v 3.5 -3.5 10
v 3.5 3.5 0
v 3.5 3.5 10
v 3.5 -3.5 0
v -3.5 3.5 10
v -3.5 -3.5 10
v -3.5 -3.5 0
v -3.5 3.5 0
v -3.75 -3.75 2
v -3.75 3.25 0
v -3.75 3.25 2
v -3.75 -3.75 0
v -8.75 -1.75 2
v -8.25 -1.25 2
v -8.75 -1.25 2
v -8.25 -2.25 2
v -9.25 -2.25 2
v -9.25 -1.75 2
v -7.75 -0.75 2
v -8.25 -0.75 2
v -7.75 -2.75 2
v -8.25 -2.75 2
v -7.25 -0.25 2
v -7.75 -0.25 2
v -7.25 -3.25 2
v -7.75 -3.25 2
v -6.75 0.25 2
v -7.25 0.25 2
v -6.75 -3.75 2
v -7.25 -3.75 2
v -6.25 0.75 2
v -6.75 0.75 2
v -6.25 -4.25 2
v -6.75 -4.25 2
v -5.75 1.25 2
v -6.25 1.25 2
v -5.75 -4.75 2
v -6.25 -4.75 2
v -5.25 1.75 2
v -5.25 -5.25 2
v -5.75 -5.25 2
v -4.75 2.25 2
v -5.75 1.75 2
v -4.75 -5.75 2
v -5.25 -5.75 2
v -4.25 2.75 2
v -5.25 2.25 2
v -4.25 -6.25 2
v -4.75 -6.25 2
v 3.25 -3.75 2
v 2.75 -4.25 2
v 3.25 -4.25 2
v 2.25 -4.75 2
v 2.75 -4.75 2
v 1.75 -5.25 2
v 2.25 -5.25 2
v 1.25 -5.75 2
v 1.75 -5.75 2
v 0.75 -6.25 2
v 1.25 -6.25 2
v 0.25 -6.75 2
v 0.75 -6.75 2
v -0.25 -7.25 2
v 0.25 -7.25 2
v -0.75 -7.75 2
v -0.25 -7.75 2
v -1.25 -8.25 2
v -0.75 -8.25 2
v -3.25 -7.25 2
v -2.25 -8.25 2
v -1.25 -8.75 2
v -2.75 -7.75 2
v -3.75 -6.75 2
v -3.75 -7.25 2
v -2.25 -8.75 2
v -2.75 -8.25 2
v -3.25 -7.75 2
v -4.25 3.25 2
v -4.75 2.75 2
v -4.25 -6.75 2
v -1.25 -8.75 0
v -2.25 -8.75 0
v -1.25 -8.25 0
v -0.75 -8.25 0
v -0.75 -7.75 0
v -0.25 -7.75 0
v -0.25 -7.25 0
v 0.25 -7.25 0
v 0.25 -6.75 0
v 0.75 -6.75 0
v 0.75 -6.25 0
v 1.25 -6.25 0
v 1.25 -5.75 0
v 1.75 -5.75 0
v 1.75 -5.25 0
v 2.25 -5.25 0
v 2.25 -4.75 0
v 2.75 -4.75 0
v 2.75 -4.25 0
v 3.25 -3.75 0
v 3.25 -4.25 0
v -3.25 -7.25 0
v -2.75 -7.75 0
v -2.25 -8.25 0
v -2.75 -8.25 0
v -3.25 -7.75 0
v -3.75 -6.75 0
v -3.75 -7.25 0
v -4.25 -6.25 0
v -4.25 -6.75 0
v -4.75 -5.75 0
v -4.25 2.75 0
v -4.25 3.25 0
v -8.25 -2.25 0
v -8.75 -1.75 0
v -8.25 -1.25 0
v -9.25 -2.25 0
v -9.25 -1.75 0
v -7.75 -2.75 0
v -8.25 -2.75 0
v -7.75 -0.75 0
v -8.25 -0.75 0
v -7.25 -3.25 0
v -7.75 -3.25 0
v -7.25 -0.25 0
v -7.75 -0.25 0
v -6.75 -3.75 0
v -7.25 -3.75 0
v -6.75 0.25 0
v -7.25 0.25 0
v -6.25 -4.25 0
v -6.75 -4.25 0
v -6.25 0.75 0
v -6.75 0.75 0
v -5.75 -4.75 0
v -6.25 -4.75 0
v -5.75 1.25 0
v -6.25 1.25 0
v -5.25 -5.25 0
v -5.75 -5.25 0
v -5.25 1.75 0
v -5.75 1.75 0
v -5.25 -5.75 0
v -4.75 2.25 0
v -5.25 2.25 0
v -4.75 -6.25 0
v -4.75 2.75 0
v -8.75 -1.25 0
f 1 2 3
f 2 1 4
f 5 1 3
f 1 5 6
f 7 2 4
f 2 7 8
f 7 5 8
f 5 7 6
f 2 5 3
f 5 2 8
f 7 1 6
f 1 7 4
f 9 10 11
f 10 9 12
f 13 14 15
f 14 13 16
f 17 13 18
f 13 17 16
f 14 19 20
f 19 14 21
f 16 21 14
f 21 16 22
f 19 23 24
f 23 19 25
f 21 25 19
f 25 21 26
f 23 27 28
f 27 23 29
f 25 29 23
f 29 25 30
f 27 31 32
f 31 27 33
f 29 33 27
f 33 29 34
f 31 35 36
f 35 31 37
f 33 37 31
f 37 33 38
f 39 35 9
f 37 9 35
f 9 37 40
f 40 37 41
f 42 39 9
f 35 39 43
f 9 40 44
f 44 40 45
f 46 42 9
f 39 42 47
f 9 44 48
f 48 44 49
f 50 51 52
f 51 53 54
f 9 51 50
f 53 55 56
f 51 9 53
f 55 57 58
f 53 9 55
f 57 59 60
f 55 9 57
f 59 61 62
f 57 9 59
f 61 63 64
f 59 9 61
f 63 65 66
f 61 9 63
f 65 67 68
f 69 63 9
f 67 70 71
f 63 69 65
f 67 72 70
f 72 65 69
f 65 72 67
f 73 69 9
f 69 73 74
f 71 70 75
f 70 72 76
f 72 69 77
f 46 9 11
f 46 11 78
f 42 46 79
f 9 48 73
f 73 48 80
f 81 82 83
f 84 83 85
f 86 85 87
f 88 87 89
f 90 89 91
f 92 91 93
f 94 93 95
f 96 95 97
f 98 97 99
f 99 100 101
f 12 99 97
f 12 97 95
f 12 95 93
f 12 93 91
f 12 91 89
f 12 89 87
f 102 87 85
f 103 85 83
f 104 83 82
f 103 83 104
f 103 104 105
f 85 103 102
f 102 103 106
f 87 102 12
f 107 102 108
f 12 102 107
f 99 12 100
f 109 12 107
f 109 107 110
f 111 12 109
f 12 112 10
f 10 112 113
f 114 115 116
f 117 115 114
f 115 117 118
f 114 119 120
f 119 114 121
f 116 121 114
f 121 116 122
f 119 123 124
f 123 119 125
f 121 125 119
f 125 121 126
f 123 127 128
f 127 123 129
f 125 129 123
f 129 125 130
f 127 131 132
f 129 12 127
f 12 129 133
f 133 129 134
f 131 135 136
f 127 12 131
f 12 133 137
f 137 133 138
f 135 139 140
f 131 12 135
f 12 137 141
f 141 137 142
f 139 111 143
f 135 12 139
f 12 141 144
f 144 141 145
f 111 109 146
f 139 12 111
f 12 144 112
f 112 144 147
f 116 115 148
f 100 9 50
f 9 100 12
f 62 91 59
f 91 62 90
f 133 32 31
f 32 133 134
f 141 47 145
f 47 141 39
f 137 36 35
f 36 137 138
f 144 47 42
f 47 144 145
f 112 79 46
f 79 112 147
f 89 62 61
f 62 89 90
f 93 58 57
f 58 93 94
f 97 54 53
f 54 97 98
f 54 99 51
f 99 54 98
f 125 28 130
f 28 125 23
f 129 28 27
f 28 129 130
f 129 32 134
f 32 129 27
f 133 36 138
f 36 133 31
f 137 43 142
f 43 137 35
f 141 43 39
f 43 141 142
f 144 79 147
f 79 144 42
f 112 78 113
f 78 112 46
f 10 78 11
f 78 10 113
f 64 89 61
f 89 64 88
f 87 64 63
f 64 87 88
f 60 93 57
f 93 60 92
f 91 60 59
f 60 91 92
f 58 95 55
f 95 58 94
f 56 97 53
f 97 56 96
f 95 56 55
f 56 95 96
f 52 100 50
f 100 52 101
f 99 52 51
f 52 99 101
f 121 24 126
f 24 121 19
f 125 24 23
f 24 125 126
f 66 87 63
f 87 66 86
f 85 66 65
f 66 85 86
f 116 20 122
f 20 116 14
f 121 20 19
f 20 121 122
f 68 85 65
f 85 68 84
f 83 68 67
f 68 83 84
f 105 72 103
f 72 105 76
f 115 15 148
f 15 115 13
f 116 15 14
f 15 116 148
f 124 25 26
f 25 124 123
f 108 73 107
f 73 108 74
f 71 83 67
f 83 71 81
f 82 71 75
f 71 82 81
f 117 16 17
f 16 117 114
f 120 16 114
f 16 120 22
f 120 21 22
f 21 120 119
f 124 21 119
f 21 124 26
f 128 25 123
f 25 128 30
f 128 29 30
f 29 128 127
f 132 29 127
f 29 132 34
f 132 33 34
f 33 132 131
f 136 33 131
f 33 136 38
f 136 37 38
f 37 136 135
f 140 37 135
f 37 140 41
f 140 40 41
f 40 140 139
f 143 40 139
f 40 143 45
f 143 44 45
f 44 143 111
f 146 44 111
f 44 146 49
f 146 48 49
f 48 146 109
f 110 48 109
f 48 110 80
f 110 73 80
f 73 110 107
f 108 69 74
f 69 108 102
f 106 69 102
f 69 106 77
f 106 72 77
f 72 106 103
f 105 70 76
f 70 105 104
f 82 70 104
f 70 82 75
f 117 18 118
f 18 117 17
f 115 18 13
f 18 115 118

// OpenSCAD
translate([0, 0, 5]) color([0,1,0,0.9]) cube([7, 7, 10], center=true);
translate([-4.0, 0.0, 1]) color([1,0,0]) cube([0.5, 0.5, 2], center=true);
translate([0.0, -4.0, 1]) color([1,0,0]) cube([0.5, 0.5, 2], center=true);
translate([-4.5, 0.0, 1]) color([1,0,0]) cube([0.5, 0.5, 2], center=true);
translate([-4.0, -0.5, 1]) color([1,0,0]) cube([0.5, 0.5, 2], center=true);
translate([-4.0, 0.5, 1]) color([1,0,0]) cube([0.5, 0.5, 2], center=true);
translate([-0.5, -4.0, 1]) color([1,0,0]) cube([0.5, 0.5, 2], center=true);
translate([0.0, -4.5, 1]) color([1,0,0]) cube([0.5, 0.5, 2], center=true);
translate([0.5, -4.0, 1]) color([1,0,0]) cube([0.5, 0.5, 2], center=true);
translate([-5.0, 0.0, 1]) color([1,0,0]) cube([0.5, 0.5, 2], center=true);
translate([-4.5, -0.5, 1]) color([1,0,0]) cube([0.5, 0.5, 2], center=true);
translate([-4.5, 0.5, 1]) color([1,0,0]) cube([0.5, 0.5, 2], center=true);
translate([-4.0, -1.0, 1]) color([1,0,0]) cube([0.5, 0.5, 2], center=true);
translate([-4.0, 1.0, 1]) color([1,0,0]) cube([0.5, 0.5, 2], center=true);
translate([-1.0, -4.0, 1]) color([1,0,0]) cube([0.5, 0.5, 2], center=true);
translate([-0.5, -4.5, 1]) color([1,0,0]) cube([0.5, 0.5, 2], center=true);
translate([0.0, -5.0, 1]) color([1,0,0]) cube([0.5, 0.5, 2], center=true);
translate([0.5, -4.5, 1]) color([1,0,0]) cube([0.5, 0.5, 2], center=true);
translate([1.0, -4.0, 1]) color([1,0,0]) cube([0.5, 0.5, 2], center=true);
translate([-5.5, 0.0, 1]) color([1,0,0]) cube([0.5, 0.5, 2], center=true);
translate([-5.0, -0.5, 1]) color([1,0,0]) cube([0.5, 0.5, 2], center=true);
translate([-5.0, 0.5, 1]) color([1,0,0]) cube([0.5, 0.5, 2], center=true);
translate([-4.5, -1.0, 1]) color([1,0,0]) cube([0.5, 0.5, 2], center=true);
translate([-4.5, 1.0, 1]) color([1,0,0]) cube([0.5, 0.5, 2], center=true);
translate([-4.0, -1.5, 1]) color([1,0,0]) cube([0.5, 0.5, 2], center=true);
translate([-4.0, 1.5, 1]) color([1,0,0]) cube([0.5, 0.5, 2], center=true);
translate([-1.5, -4.0, 1]) color([1,0,0]) cube([0.5, 0.5, 2], center=true);
translate([-1.0, -4.5, 1]) color([1,0,0]) cube([0.5, 0.5, 2], center=true);
translate([-0.5, -5.0, 1]) color([1,0,0]) cube([0.5, 0.5, 2], center=true);
translate([0.0, -5.5, 1]) color([1,0,0]) cube([0.5, 0.5, 2], center=true);
translate([0.5, -5.0, 1]) color([1,0,0]) cube([0.5, 0.5, 2], center=true);
translate([1.0, -4.5, 1]) color([1,0,0]) cube([0.5, 0.5, 2], center=true);
translate([1.5, -4.0, 1]) color([1,0,0]) cube([0.5, 0.5, 2], center=true);
translate([-6.0, 0.0, 1]) color([1,0,0]) cube([0.5, 0.5, 2], center=true);
translate([-5.5, -0.5, 1]) color([1,0,0]) cube([0.5, 0.5, 2], center=true);
translate([-5.5, 0.5, 1]) color([1,0,0]) cube([0.5, 0.5, 2], center=true);
translate([-5.0, -1.0, 1]) color([1,0,0]) cube([0.5, 0.5, 2], center=true);
translate([-5.0, 1.0, 1]) color([1,0,0]) cube([0.5, 0.5, 2], center=true);
translate([-4.5, -1.5, 1]) color([1,0,0]) cube([0.5, 0.5, 2], center=true);
translate([-4.5, 1.5, 1]) color([1,0,0]) cube([0.5, 0.5, 2], center=true);
translate([-4.0, -2.0, 1]) color([1,0,0]) cube([0.5, 0.5, 2], center=true);
translate([-4.0, 2.0, 1]) color([1,0,0]) cube([0.5, 0.5, 2], center=true);
translate([-2.0, -4.0, 1]) color([1,0,0]) cube([0.5, 0.5, 2], center=true);
translate([-1.5, -4.5, 1]) color([1,0,0]) cube([0.5, 0.5, 2], center=true);
translate([-1.0, -5.0, 1]) color([1,0,0]) cube([0.5, 0.5, 2], center=true);
translate([-0.5, -5.5, 1]) color([1,0,0]) cube([0.5, 0.5, 2], center=true);
translate([0.0, -6.0, 1]) color([1,0,0]) cube([0.5, 0.5, 2], center=true);
translate([0.5, -5.5, 1]) color([1,0,0]) cube([0.5, 0.5, 2], center=true);
translate([1.0, -5.0, 1]) color([1,0,0]) cube([0.5, 0.5, 2], center=true);
translate([1.5, -4.5, 1]) color([1,0,0]) cube([0.5, 0.5, 2], center=true);
translate([2.0, -4.0, 1]) color([1,0,0]) cube([0.5, 0.5, 2], center=true);
translate([-6.5, 0.0, 1]) color([1,0,0]) cube([0.5, 0.5, 2], center=true);
translate([-6.0, -0.5, 1]) color([1,0,0]) cube([0.5, 0.5, 2], center=true);
translate([-6.0, 0.5, 1]) color([1,0,0]) cube([0.5, 0.5, 2], center=true);
translate([-5.5, -1.0, 1]) color([1,0,0]) cube([0.5, 0.5, 2], center=true);
translate([-5.5, 1.0, 1]) color([1,0,0]) cube([0.5, 0.5, 2], center=true);
translate([-5.0, -1.5, 1]) color([1,0,0]) cube([0.5, 0.5, 2], center=true);
translate([-5.0, 1.5, 1]) color([1,0,0]) cube([0.5, 0.5, 2], center=true);
translate([-4.5, -2.0, 1]) color([1,0,0]) cube([0.5, 0.5, 2], center=true);
translate([-4.5, 2.0, 1]) color([1,0,0]) cube([0.5, 0.5, 2], center=true);
translate([-4.0, -2.5, 1]) color([1,0,0]) cube([0.5, 0.5, 2], center=true);
translate([-4.0, 2.5, 1]) color([1,0,0]) cube([0.5, 0.5, 2], center=true);
translate([-2.5, -4.0, 1]) color([1,0,0]) cube([0.5, 0.5, 2], center=true);
translate([-2.0, -4.5, 1]) color([1,0,0]) cube([0.5, 0.5, 2], center=true);
translate([-1.5, -5.0, 1]) color([1,0,0]) cube([0.5, 0.5, 2], center=true);
translate([-1.0, -5.5, 1]) color([1,0,0]) cube([0.5, 0.5, 2], center=true);
translate([-0.5, -6.0, 1]) color([1,0,0]) cube([0.5, 0.5, 2], center=true);
translate([0.0, -6.5, 1]) color([1,0,0]) cube([0.5, 0.5, 2], center=true);
translate([0.5, -6.0, 1]) color([1,0,0]) cube([0.5, 0.5, 2], center=true);
translate([1.0, -5.5, 1]) color([1,0,0]) cube([0.5, 0.5, 2], center=true);
translate([1.5, -5.0, 1]) color([1,0,0]) cube([0.5, 0.5, 2], center=true);
translate([2.0, -4.5, 1]) color([1,0,0]) cube([0.5, 0.5, 2], center=true);
translate([2.5, -4.0, 1]) color([1,0,0]) cube([0.5, 0.5, 2], center=true);
translate([-7.0, 0.0, 1]) color([1,0,0]) cube([0.5, 0.5, 2], center=true);
translate([-6.5, -0.5, 1]) color([1,0,0]) cube([0.5, 0.5, 2], center=true);
translate([-6.5, 0.5, 1]) color([1,0,0]) cube([0.5, 0.5, 2], center=true);
translate([-6.0, -1.0, 1]) color([1,0,0]) cube([0.5, 0.5, 2], center=true);
translate([-6.0, 1.0, 1]) color([1,0,0]) cube([0.5, 0.5, 2], center=true);
translate([-5.5, -1.5, 1]) color([1,0,0]) cube([0.5, 0.5, 2], center=true);
translate([-5.5, 1.5, 1]) color([1,0,0]) cube([0.5, 0.5, 2], center=true);
translate([-5.0, -2.0, 1]) color([1,0,0]) cube([0.5, 0.5, 2], center=true);
translate([-5.0, 2.0, 1]) color([1,0,0]) cube([0.5, 0.5, 2], center=true);
translate([-4.5, -2.5, 1]) color([1,0,0]) cube([0.5, 0.5, 2], center=true);
translate([-4.5, 2.5, 1]) color([1,0,0]) cube([0.5, 0.5, 2], center=true);
translate([-4.0, -3.0, 1]) color([1,0,0]) cube([0.5, 0.5, 2], center=true);
translate([-4.0, 3.0, 1]) color([1,0,0]) cube([0.5, 0.5, 2], center=true);
translate([-3.0, -4.0, 1]) color([1,0,0]) cube([0.5, 0.5, 2], center=true);
translate([-2.5, -4.5, 1]) color([1,0,0]) cube([0.5, 0.5, 2], center=true);
translate([-2.0, -5.0, 1]) color([1,0,0]) cube([0.5, 0.5, 2], center=true);
translate([-1.5, -5.5, 1]) color([1,0,0]) cube([0.5, 0.5, 2], center=true);
translate([-1.0, -6.0, 1]) color([1,0,0]) cube([0.5, 0.5, 2], center=true);
translate([-0.5, -6.5, 1]) color([1,0,0]) cube([0.5, 0.5, 2], center=true);
translate([0.0, -7.0, 1]) color([1,0,0]) cube([0.5, 0.5, 2], center=true);
translate([0.5, -6.5, 1]) color([1,0,0]) cube([0.5, 0.5, 2], center=true);
translate([1.0, -6.0, 1]) color([1,0,0]) cube([0.5, 0.5, 2], center=true);
translate([1.5, -5.5, 1]) color([1,0,0]) cube([0.5, 0.5, 2], center=true);
translate([2.0, -5.0, 1]) color([1,0,0]) cube([0.5, 0.5, 2], center=true);
translate([2.5, -4.5, 1]) color([1,0,0]) cube([0.5, 0.5, 2], center=true);
translate([3.0, -4.0, 1]) color([1,0,0]) cube([0.5, 0.5, 2], center=true);
translate([-7.0, -0.5, 1]) color([1,0,0]) cube([0.5, 0.5, 2], center=true);
translate([-6.5, -1.0, 1]) color([1,0,0]) cube([0.5, 0.5, 2], center=true);
translate([-6.0, -1.5, 1]) color([1,0,0]) cube([0.5, 0.5, 2], center=true);
translate([-5.5, -2.0, 1]) color([1,0,0]) cube([0.5, 0.5, 2], center=true);
translate([-5.0, -2.5, 1]) color([1,0,0]) cube([0.5, 0.5, 2], center=true);
translate([-4.5, -3.0, 1]) color([1,0,0]) cube([0.5, 0.5, 2], center=true);
translate([-4.0, -3.5, 1]) color([1,0,0]) cube([0.5, 0.5, 2], center=true);
translate([-3.5, -4.0, 1]) color([1,0,0]) cube([0.5, 0.5, 2], center=true);
translate([-3.0, -4.5, 1]) color([1,0,0]) cube([0.5, 0.5, 2], center=true);
translate([-2.5, -5.0, 1]) color([1,0,0]) cube([0.5, 0.5, 2], center=true);
translate([-2.0, -5.5, 1]) color([1,0,0]) cube([0.5, 0.5, 2], center=true);
translate([-1.5, -6.0, 1]) color([1,0,0]) cube([0.5, 0.5, 2], center=true);
translate([-1.0, -6.5, 1]) color([1,0,0]) cube([0.5, 0.5, 2], center=true);
translate([-0.5, -7.0, 1]) color([1,0,0]) cube([0.5, 0.5, 2], center=true);
translate([-7.5, -0.5, 1]) color([1,0,0]) cube([0.5, 0.5, 2], center=true);
translate([-7.0, -1.0, 1]) color([1,0,0]) cube([0.5, 0.5, 2], center=true);
translate([-6.5, -1.5, 1]) color([1,0,0]) cube([0.5, 0.5, 2], center=true);
translate([-6.0, -2.0, 1]) color([1,0,0]) cube([0.5, 0.5, 2], center=true);
translate([-5.5, -2.5, 1]) color([1,0,0]) cube([0.5, 0.5, 2], center=true);
translate([-5.0, -3.0, 1]) color([1,0,0]) cube([0.5, 0.5, 2], center=true);
translate([-4.5, -3.5, 1]) color([1,0,0]) cube([0.5, 0.5, 2], center=true);
translate([-4.0, -4.0, 1]) color([1,0,0]) cube([0.5, 0.5, 2], center=true);
translate([-3.5, -4.5, 1]) color([1,0,0]) cube([0.5, 0.5, 2], center=true);
translate([-3.0, -5.0, 1]) color([1,0,0]) cube([0.5, 0.5, 2], center=true);
translate([-2.5, -5.5, 1]) color([1,0,0]) cube([0.5, 0.5, 2], center=true);
translate([-2.0, -6.0, 1]) color([1,0,0]) cube([0.5, 0.5, 2], center=true);
translate([-1.5, -6.5, 1]) color([1,0,0]) cube([0.5, 0.5, 2], center=true);
translate([-1.0, -7.0, 1]) color([1,0,0]) cube([0.5, 0.5, 2], center=true);
translate([-0.5, -7.5, 1]) color([1,0,0]) cube([0.5, 0.5, 2], center=true);
translate([-7.5, -1.0, 1]) color([1,0,0]) cube([0.5, 0.5, 2], center=true);
translate([-7.0, -1.5, 1]) color([1,0,0]) cube([0.5, 0.5, 2], center=true);
translate([-6.5, -2.0, 1]) color([1,0,0]) cube([0.5, 0.5, 2], center=true);
translate([-6.0, -2.5, 1]) color([1,0,0]) cube([0.5, 0.5, 2], center=true);
translate([-5.5, -3.0, 1]) color([1,0,0]) cube([0.5, 0.5, 2], center=true);
translate([-5.0, -3.5, 1]) color([1,0,0]) cube([0.5, 0.5, 2], center=true);
translate([-4.5, -4.0, 1]) color([1,0,0]) cube([0.5, 0.5, 2], center=true);
translate([-4.0, -4.5, 1]) color([1,0,0]) cube([0.5, 0.5, 2], center=true);
translate([-3.5, -5.0, 1]) color([1,0,0]) cube([0.5, 0.5, 2], center=true);
translate([-3.0, -5.5, 1]) color([1,0,0]) cube([0.5, 0.5, 2], center=true);
translate([-2.5, -6.0, 1]) color([1,0,0]) cube([0.5, 0.5, 2], center=true);
translate([-2.0, -6.5, 1]) color([1,0,0]) cube([0.5, 0.5, 2], center=true);
translate([-1.5, -7.0, 1]) color([1,0,0]) cube([0.5, 0.5, 2], center=true);
translate([-1.0, -7.5, 1]) color([1,0,0]) cube([0.5, 0.5, 2], center=true);
translate([-8.0, -1.0, 1]) color([1,0,0]) cube([0.5, 0.5, 2], center=true);
translate([-7.5, -1.5, 1]) color([1,0,0]) cube([0.5, 0.5, 2], center=true);
translate([-7.0, -2.0, 1]) color([1,0,0]) cube([0.5, 0.5, 2], center=true);
translate([-6.5, -2.5, 1]) color([1,0,0]) cube([0.5, 0.5, 2], center=true);
translate([-6.0, -3.0, 1]) color([1,0,0]) cube([0.5, 0.5, 2], center=true);
translate([-5.5, -3.5, 1]) color([1,0,0]) cube([0.5, 0.5, 2], center=true);
translate([-5.0, -4.0, 1]) color([1,0,0]) cube([0.5, 0.5, 2], center=true);
translate([-4.5, -4.5, 1]) color([1,0,0]) cube([0.5, 0.5, 2], center=true);
translate([-4.0, -5.0, 1]) color([1,0,0]) cube([0.5, 0.5, 2], center=true);
translate([-3.5, -5.5, 1]) color([1,0,0]) cube([0.5, 0.5, 2], center=true);
translate([-3.0, -6.0, 1]) color([1,0,0]) cube([0.5, 0.5, 2], center=true);
translate([-2.5, -6.5, 1]) color([1,0,0]) cube([0.5, 0.5, 2], center=true);
translate([-2.0, -7.0, 1]) color([1,0,0]) cube([0.5, 0.5, 2], center=true);
translate([-1.5, -7.5, 1]) color([1,0,0]) cube([0.5, 0.5, 2], center=true);
translate([-1.0, -8.0, 1]) color([1,0,0]) cube([0.5, 0.5, 2], center=true);
translate([-8.0, -1.5, 1]) color([1,0,0]) cube([0.5, 0.5, 2], center=true);
translate([-7.5, -2.0, 1]) color([1,0,0]) cube([0.5, 0.5, 2], center=true);
translate([-7.0, -2.5, 1]) color([1,0,0]) cube([0.5, 0.5, 2], center=true);
translate([-6.5, -3.0, 1]) color([1,0,0]) cube([0.5, 0.5, 2], center=true);
translate([-6.0, -3.5, 1]) color([1,0,0]) cube([0.5, 0.5, 2], center=true);
translate([-5.5, -4.0, 1]) color([1,0,0]) cube([0.5, 0.5, 2], center=true);
translate([-5.0, -4.5, 1]) color([1,0,0]) cube([0.5, 0.5, 2], center=true);
translate([-4.5, -5.0, 1]) color([1,0,0]) cube([0.5, 0.5, 2], center=true);
translate([-4.0, -5.5, 1]) color([1,0,0]) cube([0.5, 0.5, 2], center=true);
translate([-3.5, -6.0, 1]) color([1,0,0]) cube([0.5, 0.5, 2], center=true);
translate([-3.0, -6.5, 1]) color([1,0,0]) cube([0.5, 0.5, 2], center=true);
translate([-2.5, -7.0, 1]) color([1,0,0]) cube([0.5, 0.5, 2], center=true);
translate([-2.0, -7.5, 1]) color([1,0,0]) cube([0.5, 0.5, 2], center=true);
translate([-1.5, -8.0, 1]) color([1,0,0]) cube([0.5, 0.5, 2], center=true);
translate([-8.5, -1.5, 1]) color([1,0,0]) cube([0.5, 0.5, 2], center=true);
translate([-8.0, -2.0, 1]) color([1,0,0]) cube([0.5, 0.5, 2], center=true);
translate([-7.5, -2.5, 1]) color([1,0,0]) cube([0.5, 0.5, 2], center=true);
translate([-7.0, -3.0, 1]) color([1,0,0]) cube([0.5, 0.5, 2], center=true);
translate([-6.5, -3.5, 1]) color([1,0,0]) cube([0.5, 0.5, 2], center=true);
translate([-6.0, -4.0, 1]) color([1,0,0]) cube([0.5, 0.5, 2], center=true);
translate([-5.5, -4.5, 1]) color([1,0,0]) cube([0.5, 0.5, 2], center=true);
translate([-5.0, -5.0, 1]) color([1,0,0]) cube([0.5, 0.5, 2], center=true);
translate([-4.5, -5.5, 1]) color([1,0,0]) cube([0.5, 0.5, 2], center=true);
translate([-4.0, -6.0, 1]) color([1,0,0]) cube([0.5, 0.5, 2], center=true);
translate([-3.5, -6.5, 1]) color([1,0,0]) cube([0.5, 0.5, 2], center=true);
translate([-3.0, -7.0, 1]) color([1,0,0]) cube([0.5, 0.5, 2], center=true);
translate([-2.5, -7.5, 1]) color([1,0,0]) cube([0.5, 0.5, 2], center=true);
translate([-2.0, -8.0, 1]) color([1,0,0]) cube([0.5, 0.5, 2], center=true);
translate([-1.5, -8.5, 1]) color([1,0,0]) cube([0.5, 0.5, 2], center=true);
translate([-8.5, -2.0, 1]) color([1,0,0]) cube([0.5, 0.5, 2], center=true);
translate([-8.0, -2.5, 1]) color([1,0,0]) cube([0.5, 0.5, 2], center=true);
translate([-7.5, -3.0, 1]) color([1,0,0]) cube([0.5, 0.5, 2], center=true);
translate([-7.0, -3.5, 1]) color([1,0,0]) cube([0.5, 0.5, 2], center=true);
translate([-6.5, -4.0, 1]) color([1,0,0]) cube([0.5, 0.5, 2], center=true);
translate([-6.0, -4.5, 1]) color([1,0,0]) cube([0.5, 0.5, 2], center=true);
translate([-5.5, -5.0, 1]) color([1,0,0]) cube([0.5, 0.5, 2], center=true);
translate([-5.0, -5.5, 1]) color([1,0,0]) cube([0.5, 0.5, 2], center=true);
translate([-4.5, -6.0, 1]) color([1,0,0]) cube([0.5, 0.5, 2], center=true);
translate([-4.0, -6.5, 1]) color([1,0,0]) cube([0.5, 0.5, 2], center=true);
translate([-3.5, -7.0, 1]) color([1,0,0]) cube([0.5, 0.5, 2], center=true);
translate([-3.0, -7.5, 1]) color([1,0,0]) cube([0.5, 0.5, 2], center=true);
translate([-2.5, -8.0, 1]) color([1,0,0]) cube([0.5, 0.5, 2], center=true);
translate([-2.0, -8.5, 1]) color([1,0,0]) cube([0.5, 0.5, 2], center=true);
translate([-9.0, -2.0, 1]) color([1,0,0]) cube([0.5, 0.5, 2], center=true);
